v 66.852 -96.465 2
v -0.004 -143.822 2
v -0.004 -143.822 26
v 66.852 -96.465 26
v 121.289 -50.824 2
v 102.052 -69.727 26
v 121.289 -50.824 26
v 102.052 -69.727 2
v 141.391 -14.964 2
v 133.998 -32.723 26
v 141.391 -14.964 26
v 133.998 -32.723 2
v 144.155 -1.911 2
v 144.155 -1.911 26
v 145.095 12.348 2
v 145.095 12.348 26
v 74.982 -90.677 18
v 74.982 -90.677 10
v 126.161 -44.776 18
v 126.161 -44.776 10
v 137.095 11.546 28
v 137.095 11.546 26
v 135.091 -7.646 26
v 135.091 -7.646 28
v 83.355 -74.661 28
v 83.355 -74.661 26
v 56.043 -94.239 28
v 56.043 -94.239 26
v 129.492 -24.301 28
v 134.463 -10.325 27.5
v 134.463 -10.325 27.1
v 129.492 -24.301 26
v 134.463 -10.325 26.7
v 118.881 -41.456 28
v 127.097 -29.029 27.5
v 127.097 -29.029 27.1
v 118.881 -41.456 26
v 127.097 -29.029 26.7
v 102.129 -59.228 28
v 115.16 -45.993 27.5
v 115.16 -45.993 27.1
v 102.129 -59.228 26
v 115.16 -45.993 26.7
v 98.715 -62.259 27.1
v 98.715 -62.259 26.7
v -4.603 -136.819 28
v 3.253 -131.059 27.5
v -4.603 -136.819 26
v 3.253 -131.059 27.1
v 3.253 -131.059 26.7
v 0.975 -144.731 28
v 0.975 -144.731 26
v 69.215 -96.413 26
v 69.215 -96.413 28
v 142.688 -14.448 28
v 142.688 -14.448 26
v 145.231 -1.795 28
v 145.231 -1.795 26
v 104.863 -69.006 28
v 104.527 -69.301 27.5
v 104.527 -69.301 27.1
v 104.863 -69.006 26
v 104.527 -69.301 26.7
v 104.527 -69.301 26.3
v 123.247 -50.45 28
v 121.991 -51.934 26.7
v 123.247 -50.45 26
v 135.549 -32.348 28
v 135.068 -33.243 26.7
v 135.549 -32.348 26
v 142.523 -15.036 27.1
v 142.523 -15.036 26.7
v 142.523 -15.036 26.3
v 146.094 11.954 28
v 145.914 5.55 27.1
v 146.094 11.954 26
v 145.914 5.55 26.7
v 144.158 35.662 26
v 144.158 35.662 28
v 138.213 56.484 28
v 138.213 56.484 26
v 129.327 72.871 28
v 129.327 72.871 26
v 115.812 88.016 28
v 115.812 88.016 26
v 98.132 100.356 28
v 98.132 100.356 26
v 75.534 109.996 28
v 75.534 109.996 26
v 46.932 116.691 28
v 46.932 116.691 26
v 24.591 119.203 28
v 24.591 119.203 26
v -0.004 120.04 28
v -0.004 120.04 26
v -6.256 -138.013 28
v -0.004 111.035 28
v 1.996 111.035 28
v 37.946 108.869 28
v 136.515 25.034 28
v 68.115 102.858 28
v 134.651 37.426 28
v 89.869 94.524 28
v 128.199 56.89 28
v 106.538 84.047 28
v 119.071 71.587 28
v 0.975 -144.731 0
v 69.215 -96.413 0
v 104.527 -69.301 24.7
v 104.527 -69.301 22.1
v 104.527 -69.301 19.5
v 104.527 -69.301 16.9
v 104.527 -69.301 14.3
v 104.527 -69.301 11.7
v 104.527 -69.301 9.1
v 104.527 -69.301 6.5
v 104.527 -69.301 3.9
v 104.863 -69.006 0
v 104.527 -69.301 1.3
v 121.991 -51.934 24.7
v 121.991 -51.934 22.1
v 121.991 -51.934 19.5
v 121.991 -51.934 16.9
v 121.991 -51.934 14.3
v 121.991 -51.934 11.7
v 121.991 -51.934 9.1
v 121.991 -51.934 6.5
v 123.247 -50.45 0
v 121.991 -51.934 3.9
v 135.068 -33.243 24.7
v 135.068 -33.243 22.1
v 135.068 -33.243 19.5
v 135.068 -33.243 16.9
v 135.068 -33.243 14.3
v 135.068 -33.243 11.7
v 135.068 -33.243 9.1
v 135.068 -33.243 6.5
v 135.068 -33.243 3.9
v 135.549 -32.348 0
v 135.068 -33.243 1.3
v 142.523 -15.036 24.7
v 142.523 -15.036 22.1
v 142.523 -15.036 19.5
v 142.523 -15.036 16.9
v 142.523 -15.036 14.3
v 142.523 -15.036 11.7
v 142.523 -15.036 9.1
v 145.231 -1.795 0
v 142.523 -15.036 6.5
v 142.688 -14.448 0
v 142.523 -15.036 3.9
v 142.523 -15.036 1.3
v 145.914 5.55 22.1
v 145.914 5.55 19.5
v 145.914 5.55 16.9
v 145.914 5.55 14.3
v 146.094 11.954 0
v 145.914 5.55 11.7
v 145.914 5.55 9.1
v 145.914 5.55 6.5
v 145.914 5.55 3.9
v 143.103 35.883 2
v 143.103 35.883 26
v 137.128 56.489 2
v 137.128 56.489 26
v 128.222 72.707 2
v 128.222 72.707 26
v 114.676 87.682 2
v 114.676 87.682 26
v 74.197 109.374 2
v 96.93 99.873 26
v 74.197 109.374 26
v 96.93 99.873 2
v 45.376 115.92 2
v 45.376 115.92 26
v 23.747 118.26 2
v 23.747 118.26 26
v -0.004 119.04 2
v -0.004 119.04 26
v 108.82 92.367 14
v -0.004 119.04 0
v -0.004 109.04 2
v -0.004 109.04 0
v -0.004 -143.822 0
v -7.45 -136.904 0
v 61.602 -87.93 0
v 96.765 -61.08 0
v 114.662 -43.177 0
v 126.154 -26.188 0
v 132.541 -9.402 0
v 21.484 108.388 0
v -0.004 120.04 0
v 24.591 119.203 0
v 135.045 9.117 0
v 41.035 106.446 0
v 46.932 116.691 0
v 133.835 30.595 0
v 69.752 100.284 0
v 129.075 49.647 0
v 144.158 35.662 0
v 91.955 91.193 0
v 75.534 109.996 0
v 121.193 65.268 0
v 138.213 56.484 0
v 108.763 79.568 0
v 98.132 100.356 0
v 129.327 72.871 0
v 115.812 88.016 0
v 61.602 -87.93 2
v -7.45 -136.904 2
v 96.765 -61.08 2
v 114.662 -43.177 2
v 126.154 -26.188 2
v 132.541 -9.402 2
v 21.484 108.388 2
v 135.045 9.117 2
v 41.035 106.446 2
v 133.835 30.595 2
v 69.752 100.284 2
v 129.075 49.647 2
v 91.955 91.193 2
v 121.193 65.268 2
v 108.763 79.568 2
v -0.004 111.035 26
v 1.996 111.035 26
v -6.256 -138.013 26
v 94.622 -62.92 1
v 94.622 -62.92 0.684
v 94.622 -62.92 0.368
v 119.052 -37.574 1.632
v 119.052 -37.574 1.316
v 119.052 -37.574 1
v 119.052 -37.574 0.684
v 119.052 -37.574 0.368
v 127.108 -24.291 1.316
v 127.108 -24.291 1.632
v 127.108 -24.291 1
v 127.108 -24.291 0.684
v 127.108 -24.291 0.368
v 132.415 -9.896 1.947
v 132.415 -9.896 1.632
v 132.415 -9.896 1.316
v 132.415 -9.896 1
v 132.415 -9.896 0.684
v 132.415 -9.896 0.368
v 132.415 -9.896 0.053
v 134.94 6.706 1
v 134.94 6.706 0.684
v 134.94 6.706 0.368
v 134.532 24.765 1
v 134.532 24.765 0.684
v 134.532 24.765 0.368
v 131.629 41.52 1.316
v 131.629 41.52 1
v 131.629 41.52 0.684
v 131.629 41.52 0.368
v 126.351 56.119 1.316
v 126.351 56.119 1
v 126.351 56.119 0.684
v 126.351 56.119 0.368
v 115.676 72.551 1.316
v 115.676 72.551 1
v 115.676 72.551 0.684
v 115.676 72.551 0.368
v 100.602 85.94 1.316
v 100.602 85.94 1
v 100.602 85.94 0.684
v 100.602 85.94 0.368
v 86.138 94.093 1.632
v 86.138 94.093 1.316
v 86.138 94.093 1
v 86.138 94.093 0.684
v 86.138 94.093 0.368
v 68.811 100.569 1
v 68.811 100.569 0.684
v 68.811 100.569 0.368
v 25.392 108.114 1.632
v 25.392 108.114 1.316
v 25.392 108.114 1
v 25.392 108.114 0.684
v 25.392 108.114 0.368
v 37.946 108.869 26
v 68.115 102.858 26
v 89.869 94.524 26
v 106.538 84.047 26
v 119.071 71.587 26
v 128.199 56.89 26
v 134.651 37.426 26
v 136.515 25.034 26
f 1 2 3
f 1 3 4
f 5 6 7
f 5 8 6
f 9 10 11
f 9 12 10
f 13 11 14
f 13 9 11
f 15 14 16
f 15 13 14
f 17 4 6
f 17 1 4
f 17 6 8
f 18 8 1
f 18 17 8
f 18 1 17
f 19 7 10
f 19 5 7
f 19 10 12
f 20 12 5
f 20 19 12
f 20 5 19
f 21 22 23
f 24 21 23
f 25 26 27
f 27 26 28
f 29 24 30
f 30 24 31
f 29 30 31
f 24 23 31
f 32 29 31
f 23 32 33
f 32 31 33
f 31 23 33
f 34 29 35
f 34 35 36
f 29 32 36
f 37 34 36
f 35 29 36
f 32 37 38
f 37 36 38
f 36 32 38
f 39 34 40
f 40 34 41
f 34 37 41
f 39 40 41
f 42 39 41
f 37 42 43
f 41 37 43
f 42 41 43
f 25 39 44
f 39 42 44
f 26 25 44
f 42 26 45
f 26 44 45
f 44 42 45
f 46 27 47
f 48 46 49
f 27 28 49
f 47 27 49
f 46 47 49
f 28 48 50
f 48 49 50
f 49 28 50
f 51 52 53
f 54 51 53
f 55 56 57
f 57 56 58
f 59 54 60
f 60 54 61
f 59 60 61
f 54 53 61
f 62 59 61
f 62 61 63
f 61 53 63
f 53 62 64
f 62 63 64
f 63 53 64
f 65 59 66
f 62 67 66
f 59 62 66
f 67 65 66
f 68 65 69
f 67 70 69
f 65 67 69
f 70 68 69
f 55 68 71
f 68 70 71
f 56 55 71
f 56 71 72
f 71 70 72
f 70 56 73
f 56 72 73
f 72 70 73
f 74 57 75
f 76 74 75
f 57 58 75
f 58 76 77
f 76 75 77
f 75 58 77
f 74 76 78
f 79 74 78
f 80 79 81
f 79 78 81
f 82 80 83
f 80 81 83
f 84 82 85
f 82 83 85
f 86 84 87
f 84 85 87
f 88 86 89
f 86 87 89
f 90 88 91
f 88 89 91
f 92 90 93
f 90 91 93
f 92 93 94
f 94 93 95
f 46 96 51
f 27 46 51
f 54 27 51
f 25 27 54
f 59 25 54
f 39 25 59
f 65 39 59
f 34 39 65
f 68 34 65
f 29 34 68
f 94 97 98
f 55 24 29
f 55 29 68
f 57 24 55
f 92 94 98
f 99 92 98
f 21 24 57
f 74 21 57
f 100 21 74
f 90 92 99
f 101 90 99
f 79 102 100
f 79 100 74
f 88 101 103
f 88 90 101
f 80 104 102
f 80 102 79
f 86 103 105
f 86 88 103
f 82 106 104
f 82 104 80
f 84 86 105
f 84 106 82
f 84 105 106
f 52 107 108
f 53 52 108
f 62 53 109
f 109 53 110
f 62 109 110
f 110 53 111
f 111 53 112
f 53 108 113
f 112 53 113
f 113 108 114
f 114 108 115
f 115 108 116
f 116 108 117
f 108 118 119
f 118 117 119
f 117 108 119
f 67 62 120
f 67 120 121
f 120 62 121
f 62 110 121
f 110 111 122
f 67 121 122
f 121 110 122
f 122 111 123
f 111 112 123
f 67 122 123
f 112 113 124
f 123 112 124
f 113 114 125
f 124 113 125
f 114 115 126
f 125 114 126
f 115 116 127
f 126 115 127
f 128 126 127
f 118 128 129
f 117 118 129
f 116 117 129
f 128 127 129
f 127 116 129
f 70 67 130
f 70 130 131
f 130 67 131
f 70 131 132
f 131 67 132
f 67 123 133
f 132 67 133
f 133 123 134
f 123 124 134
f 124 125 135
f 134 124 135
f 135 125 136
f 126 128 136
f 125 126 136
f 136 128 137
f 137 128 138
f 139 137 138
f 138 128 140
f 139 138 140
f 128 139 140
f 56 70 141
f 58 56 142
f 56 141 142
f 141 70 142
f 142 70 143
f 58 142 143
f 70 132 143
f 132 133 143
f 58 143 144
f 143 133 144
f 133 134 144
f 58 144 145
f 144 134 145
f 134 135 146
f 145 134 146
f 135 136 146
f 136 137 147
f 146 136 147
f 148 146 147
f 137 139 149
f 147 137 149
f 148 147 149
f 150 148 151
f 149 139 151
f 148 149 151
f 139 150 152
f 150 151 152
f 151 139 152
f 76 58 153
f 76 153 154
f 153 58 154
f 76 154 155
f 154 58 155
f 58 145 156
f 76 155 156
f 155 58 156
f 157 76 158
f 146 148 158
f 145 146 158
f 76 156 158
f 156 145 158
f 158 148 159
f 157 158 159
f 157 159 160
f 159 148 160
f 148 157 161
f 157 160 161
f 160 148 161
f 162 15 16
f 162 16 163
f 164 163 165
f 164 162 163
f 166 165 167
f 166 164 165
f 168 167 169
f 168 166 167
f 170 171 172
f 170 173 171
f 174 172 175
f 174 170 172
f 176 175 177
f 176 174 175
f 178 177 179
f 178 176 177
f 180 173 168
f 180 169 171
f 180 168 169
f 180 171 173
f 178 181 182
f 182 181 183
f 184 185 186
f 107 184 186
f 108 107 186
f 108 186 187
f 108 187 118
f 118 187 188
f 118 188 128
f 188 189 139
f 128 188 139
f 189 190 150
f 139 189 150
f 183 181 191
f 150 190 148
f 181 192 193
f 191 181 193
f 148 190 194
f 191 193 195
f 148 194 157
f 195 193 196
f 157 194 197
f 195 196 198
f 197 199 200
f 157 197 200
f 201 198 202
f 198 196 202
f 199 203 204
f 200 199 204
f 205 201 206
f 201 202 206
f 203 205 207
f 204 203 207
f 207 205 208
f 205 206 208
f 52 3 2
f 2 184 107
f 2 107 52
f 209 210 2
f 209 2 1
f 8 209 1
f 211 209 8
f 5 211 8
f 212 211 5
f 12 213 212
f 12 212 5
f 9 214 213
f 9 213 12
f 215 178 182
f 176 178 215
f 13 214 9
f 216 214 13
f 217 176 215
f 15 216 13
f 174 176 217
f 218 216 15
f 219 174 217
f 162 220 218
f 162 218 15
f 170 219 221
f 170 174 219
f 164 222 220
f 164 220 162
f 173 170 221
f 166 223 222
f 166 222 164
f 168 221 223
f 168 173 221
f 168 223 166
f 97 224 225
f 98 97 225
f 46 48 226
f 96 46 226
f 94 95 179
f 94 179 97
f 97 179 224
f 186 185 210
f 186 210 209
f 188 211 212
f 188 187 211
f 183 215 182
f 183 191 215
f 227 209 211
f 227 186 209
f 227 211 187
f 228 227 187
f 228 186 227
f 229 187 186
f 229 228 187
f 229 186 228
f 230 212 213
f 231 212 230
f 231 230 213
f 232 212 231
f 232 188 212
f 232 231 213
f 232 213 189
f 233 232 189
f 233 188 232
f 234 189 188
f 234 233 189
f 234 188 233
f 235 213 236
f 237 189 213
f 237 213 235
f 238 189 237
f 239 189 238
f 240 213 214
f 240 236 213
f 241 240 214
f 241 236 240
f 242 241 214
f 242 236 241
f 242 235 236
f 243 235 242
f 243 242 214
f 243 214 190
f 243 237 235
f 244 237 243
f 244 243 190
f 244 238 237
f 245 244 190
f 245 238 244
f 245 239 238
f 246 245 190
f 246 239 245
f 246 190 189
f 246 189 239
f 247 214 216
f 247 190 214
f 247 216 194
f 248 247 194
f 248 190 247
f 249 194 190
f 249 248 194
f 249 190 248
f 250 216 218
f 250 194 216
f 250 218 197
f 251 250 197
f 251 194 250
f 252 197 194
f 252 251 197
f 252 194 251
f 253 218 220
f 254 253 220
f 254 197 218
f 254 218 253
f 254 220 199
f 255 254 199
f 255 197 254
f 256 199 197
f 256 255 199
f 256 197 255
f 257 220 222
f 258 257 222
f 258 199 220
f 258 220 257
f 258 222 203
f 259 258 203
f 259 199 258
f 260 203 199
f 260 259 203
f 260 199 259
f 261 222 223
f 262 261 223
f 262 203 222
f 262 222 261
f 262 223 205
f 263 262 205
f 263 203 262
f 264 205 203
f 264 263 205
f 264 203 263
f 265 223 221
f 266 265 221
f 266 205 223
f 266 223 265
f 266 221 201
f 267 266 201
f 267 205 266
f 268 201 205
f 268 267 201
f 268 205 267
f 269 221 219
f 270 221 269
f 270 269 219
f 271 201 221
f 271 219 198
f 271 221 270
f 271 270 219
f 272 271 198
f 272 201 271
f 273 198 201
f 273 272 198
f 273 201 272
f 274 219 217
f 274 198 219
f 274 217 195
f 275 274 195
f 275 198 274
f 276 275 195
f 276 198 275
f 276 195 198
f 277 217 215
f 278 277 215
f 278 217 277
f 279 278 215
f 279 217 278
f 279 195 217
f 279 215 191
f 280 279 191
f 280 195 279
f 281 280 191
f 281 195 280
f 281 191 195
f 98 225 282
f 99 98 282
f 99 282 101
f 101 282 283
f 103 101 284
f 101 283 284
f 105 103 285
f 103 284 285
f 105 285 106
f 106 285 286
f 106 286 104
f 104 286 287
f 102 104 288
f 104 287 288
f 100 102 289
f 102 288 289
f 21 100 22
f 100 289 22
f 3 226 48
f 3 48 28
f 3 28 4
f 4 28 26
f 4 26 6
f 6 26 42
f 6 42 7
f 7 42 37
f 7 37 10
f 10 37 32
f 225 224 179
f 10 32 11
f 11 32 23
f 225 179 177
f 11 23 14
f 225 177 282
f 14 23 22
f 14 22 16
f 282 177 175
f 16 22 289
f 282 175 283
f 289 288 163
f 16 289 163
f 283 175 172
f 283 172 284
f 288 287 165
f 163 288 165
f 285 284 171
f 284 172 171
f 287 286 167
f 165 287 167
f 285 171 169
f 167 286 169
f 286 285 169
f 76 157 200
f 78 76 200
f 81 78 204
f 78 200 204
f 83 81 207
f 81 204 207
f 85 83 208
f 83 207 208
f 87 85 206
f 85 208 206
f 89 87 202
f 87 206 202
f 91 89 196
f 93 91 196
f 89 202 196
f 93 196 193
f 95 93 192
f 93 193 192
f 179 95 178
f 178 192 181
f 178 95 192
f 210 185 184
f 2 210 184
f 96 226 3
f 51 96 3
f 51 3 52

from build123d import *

# Parameters (mm, degrees)
BOSS_EXTRU_2_DEPTH = 2
BOSS_EXTRU_3_START = -2
BOSS_EXTRU_3_DEPTH = 26
BOSS_EXTRU_4_DEPTH = 2


with BuildPart() as part:
    # Esquisse1 → Boss.-Extru.2 (new body)
    with BuildSketch(Plane.XY):
        with BuildLine():
            Line((-0.00400884, 119.040016289), (-0.00400884, 109.040016289))
            add(Edge.make_bspline(
                [(135.094881688, 12.347656768), (135.094881688, 13.413901205), (135.071208206, 15.561386013), (134.929810594, 19.734818404), (134.577965377, 24.807384894), (133.879838594, 30.638399661), (132.586934474, 38.083732214), (130.303010899, 46.775838335), (126.522895447, 56.26542587), (121.714013565, 64.87582069), (113.906223439, 75.274579224), (101.414591155, 86.411112386), (84.858728164, 95.192064474), (69.027521057, 100.70017665), (55.854146224, 104.041872862), (41.378624621, 106.567746277), (28.23572446, 107.974828147), (17.076606526, 108.67368115), (8.962691216, 108.96245631), (3.196225492, 109.035828431), (0.377060546, 109.040016289), (-0.00400884, 109.040016289)],
                knots=[0.497645186, 0.497645186, 0.497645186, 0.497645186, 0.49775367, 0.497862155, 0.498079123, 0.498296092, 0.498513061, 0.498946998, 0.499380936, 0.499814874, 0.500248811, 0.501116686, 0.501984561, 0.502418499, 0.502852437, 0.503286374, 0.503720312, 0.50393728, 0.504154249, 0.50432818, 0.504355301, 0.504355301, 0.504355301, 0.504355301], degree=3))
            add(Edge.make_bspline(
                [(-7.449810705, -136.903796747), (-7.10889508, -136.648659025), (-5.729139825, -135.616252852), (-2.963715196, -133.550423631), (4.889274506, -127.747683962), (16.846101009, -119.129451608), (32.071653761, -108.457658237), (46.502334017, -98.474358922), (60.065937573, -89.050300935), (76.895347004, -77.063866417), (95.393165507, -62.85955821), (110.033873571, -48.95682606), (119.259236565, -37.611895851), (124.934715012, -28.873289935), (129.38275296, -19.749589671), (132.080400116, -11.653928753), (133.622437355, -4.760222546), (134.46296061, 0.646964432), (134.891739077, 5.381679919), (135.065530665, 9.303607794), (135.094881688, 11.339077189), (135.094881688, 12.347656768)],
                knots=[0.348198397, 0.348198397, 0.348198397, 0.348198397, 0.350826165, 0.35882463, 0.369335702, 0.411379988, 0.453424275, 0.495468561, 0.537512848, 0.579557134, 0.663645708, 0.747734281, 0.789778567, 0.831822854, 0.87386714, 0.915911427, 0.93693357, 0.957955713, 0.978977857, 0.989488928, 1, 1, 1, 1], degree=3))
            Line((-7.449810705, -136.903796747), (-0.00400884, -143.821780254))
            add(Edge.make_bspline(
                [(-0.00400884, -143.821780254), (84.073321163, -80.899177556), (145.094881689, -56.542131568), (145.094881688, 12.347656767)],
                knots=[0.351934339, 0.351934339, 0.351934339, 0.351934339, 1, 1, 1, 1], degree=3))
            add(Edge.make_bspline(
                [(145.094881688, 12.347656767), (145.094881688, 119.040016289), (-0.00400884, 119.040016289)],
                knots=[0, 0, 0, 1, 1, 1], degree=2))
        make_face()
    extrude(amount=BOSS_EXTRU_2_DEPTH)

    # Esquisse2 → Boss.-Extru.3 (add)
    with BuildSketch(Plane.XY.offset(2).offset(BOSS_EXTRU_3_START)):
        with BuildLine():
            Line((-0.004008825, 120.040016289), (-0.004008826, 119.040016289))
            add(Edge.make_bspline(
                [(145.094881688, 12.347656779), (145.09488168, 119.040016284), (-0.004008826, 119.040016289)],
                knots=[0, 0, 0, 1, 1, 1], degree=2))
            add(Edge.make_bspline(
                [(-0.00400884, -143.821780254), (84.073321163, -80.899177556), (145.094881689, -56.542131568), (145.094881688, 12.347656779)],
                knots=[0.351934339, 0.351934339, 0.351934339, 0.351934339, 1, 1, 1, 1], degree=3))
            Line((-0.00400884, -143.821780254), (0.974938317, -144.731331758))
            add(Edge.make_bspline(
                [(0.974938317, -144.731331758), (1.940347306, -144.009490017), (4.21694405, -142.313603561), (9.069225919, -138.732599504), (15.486781125, -134.06221379), (23.035718298, -128.658372426), (32.89561739, -121.694049694), (44.81515406, -113.404531475), (58.415951602, -103.998408935), (71.258842891, -95.010378812), (87.298930593, -83.418573034), (105.179437585, -69.354076661), (119.797375804, -55.02176587), (129.301227667, -42.891938136), (135.271714019, -33.338868533), (140.021533003, -23.209667681), (142.910061689, -14.192327822), (144.54940778, -6.575429809), (145.436220501, -0.648844125), (145.883993765, 4.48605166), (146.064181974, 8.705544543), (146.094392663, 10.876345952), (146.094392664, 11.95427261)],
                knots=[0.352912923, 0.352912923, 0.352912923, 0.352912923, 0.360370171, 0.370523026, 0.390828735, 0.411134444, 0.431440152, 0.47205157, 0.512662988, 0.553274405, 0.593885823, 0.675108659, 0.756331494, 0.796942912, 0.837554329, 0.878165747, 0.918777165, 0.939082873, 0.959388582, 0.979694291, 0.989847146, 1, 1, 1, 1], degree=3))
            add(Edge.make_bspline(
                [(146.094392664, 11.95427261), (146.097169698, 13.072010325), (146.078781877, 15.319946132), (145.945806495, 19.715306464), (145.599271174, 25.090276491), (144.894482198, 31.327678025), (143.568987818, 39.368274841), (141.187761716, 48.897461146), (137.168556158, 59.495541245), (131.986355052, 69.250882021), (123.527763641, 81.126183408), (110.059371985, 93.832155871), (92.76947067, 103.671463097), (76.660196542, 109.831050786), (63.440632963, 113.59775321), (49.083840319, 116.514014852), (36.172205395, 118.237343204), (25.273213662, 119.192706074), (16.815980973, 119.69774819), (9.525747125, 119.942490272), (3.969994561, 120.026549051), (1.268546425, 120.039639283), (0.07918291, 120.040016289), (-0.004008825, 120.040016289)],
                knots=[0.497632905, 0.497632905, 0.497632905, 0.497632905, 0.497738302, 0.497843699, 0.498054494, 0.498265288, 0.498476082, 0.498897671, 0.49931926, 0.499740849, 0.500162438, 0.501005615, 0.501848793, 0.502270382, 0.502691971, 0.50311356, 0.503535149, 0.503745943, 0.503956737, 0.504167532, 0.504272929, 0.504349545, 0.504355301, 0.504355301, 0.504355301, 0.504355301], degree=3))
        make_face()
    extrude(amount=BOSS_EXTRU_3_DEPTH)

    # Esquisse3 → Boss.-Extru.4 (add)
    with BuildSketch(Plane.XY.offset(26)):
        with BuildLine():
            Line((-6.255730586, -138.013230858), (0.974938317, -144.731331758))
            add(Edge.make_bspline(
                [(0.974938317, -144.731331758), (1.940347306, -144.009490017), (4.21694405, -142.313603561), (9.069225919, -138.732599504), (15.486781125, -134.06221379), (23.035718298, -128.658372426), (32.89561739, -121.694049694), (44.81515406, -113.404531475), (58.415951602, -103.998408935), (71.258842891, -95.010378812), (87.298930593, -83.418573034), (105.179437585, -69.354076661), (119.797375804, -55.02176587), (129.301227667, -42.891938136), (135.271714019, -33.338868533), (140.021533003, -23.209667681), (142.910061689, -14.192327822), (144.54940778, -6.575429809), (145.436220501, -0.648844125), (145.883993765, 4.48605166), (146.064181974, 8.705544543), (146.094392663, 10.876345952), (146.094392664, 11.95427261)],
                knots=[0.352912923, 0.352912923, 0.352912923, 0.352912923, 0.360370171, 0.370523026, 0.390828735, 0.411134444, 0.431440152, 0.47205157, 0.512662988, 0.553274405, 0.593885823, 0.675108659, 0.756331494, 0.796942912, 0.837554329, 0.878165747, 0.918777165, 0.939082873, 0.959388582, 0.979694291, 0.989847146, 1, 1, 1, 1], degree=3))
            add(Edge.make_bspline(
                [(146.094392664, 11.95427261), (146.097169698, 13.072010325), (146.078781877, 15.319946132), (145.945806495, 19.715306464), (145.599271174, 25.090276491), (144.894482198, 31.327678025), (143.568987818, 39.368274841), (141.187761716, 48.897461146), (137.168556158, 59.495541245), (131.986355052, 69.250882021), (123.527763641, 81.126183408), (110.059371985, 93.832155871), (92.76947067, 103.671463097), (76.660196542, 109.831050786), (63.440632963, 113.59775321), (49.083840319, 116.514014852), (36.172205395, 118.237343204), (25.273213662, 119.192706074), (16.815980973, 119.69774819), (9.525747125, 119.942490272), (3.969994561, 120.026549051), (1.268546425, 120.039639283), (0.07918291, 120.040016289), (-0.004008825, 120.040016289)],
                knots=[0.497632905, 0.497632905, 0.497632905, 0.497632905, 0.497738302, 0.497843699, 0.498054494, 0.498265288, 0.498476082, 0.498897671, 0.49931926, 0.499740849, 0.500162438, 0.501005615, 0.501848793, 0.502270382, 0.502691971, 0.50311356, 0.503535149, 0.503745943, 0.503956737, 0.504167532, 0.504272929, 0.504349545, 0.504355301, 0.504355301, 0.504355301, 0.504355301], degree=3))
            Line((-0.004008825, 120.040016289), (-0.004008837, 111.034812981))
            Line((-0.004008837, 111.034812981), (1.995991163, 111.034812981))
            add(Edge.make_bspline(
                [(1.995991163, 111.034812981), (3.449262421, 111.027220593), (6.373451501, 110.994919277), (12.078992886, 110.86307951), (19.041360742, 110.572013465), (27.096560383, 110.021948285), (37.44407538, 109.022298227), (49.636750503, 107.277037509), (63.077298444, 104.403154728), (75.325820827, 100.767072473), (90.070257503, 94.929738917), (105.558045333, 85.838284977), (117.326821816, 74.44364635), (124.692400635, 63.871078074), (129.218597962, 55.159425743), (132.755299467, 45.619839598), (134.868553088, 36.942511152), (136.048603344, 29.554857683), (136.673045155, 23.780276366), (137.042498844, 17.801325721), (137.094881688, 13.614675878), (137.094881688, 11.546026453)],
                knots=[0.497925446, 0.497925446, 0.497925446, 0.497925446, 0.498029976, 0.498134506, 0.498343566, 0.498552626, 0.498761687, 0.499179807, 0.499597928, 0.500016048, 0.500434169, 0.50127041, 0.502106651, 0.502524771, 0.502942892, 0.503361012, 0.503779133, 0.503988193, 0.504197253, 0.504406314, 0.504615374, 0.504615374, 0.504615374, 0.504615374], degree=3))
            add(Edge.make_bspline(
                [(137.094881688, 11.546026453), (137.090459851, 10.56000328), (137.053988144, 8.572176445), (136.873136382, 4.726528145), (136.448066581, 0.078634705), (135.629544709, -5.251256128), (134.138536999, -12.059875265), (131.543268898, -20.076285021), (127.287184822, -29.098949454), (121.889707547, -37.700731392), (113.169191271, -48.794863494), (99.423443834, -62.24312359), (82.136049919, -75.772908771), (66.415298449, -87.051616014), (53.742936395, -95.846083964), (40.251923361, -105.089213893), (28.379063236, -113.260921468), (18.534046888, -120.138514542), (10.986640564, -125.480414397), (4.561562429, -130.101377496), (-0.648471776, -133.898956426), (-3.289933492, -135.846791526), (-4.603005712, -136.818779696)],
                knots=[0.327291415, 0.327291415, 0.327291415, 0.327291415, 0.337398931, 0.347506447, 0.367721479, 0.387936511, 0.408151543, 0.448581608, 0.489011672, 0.529441736, 0.5698718, 0.650731928, 0.731592057, 0.772022121, 0.812452185, 0.852882249, 0.893312313, 0.913527345, 0.933742378, 0.95395741, 0.964064926, 0.974172442, 0.974172442, 0.974172442, 0.974172442], degree=3))
            Line((-4.603005712, -136.818779696), (-6.255730586, -138.013230858))
        make_face()
    extrude(amount=BOSS_EXTRU_4_DEPTH)


solid = part.part
